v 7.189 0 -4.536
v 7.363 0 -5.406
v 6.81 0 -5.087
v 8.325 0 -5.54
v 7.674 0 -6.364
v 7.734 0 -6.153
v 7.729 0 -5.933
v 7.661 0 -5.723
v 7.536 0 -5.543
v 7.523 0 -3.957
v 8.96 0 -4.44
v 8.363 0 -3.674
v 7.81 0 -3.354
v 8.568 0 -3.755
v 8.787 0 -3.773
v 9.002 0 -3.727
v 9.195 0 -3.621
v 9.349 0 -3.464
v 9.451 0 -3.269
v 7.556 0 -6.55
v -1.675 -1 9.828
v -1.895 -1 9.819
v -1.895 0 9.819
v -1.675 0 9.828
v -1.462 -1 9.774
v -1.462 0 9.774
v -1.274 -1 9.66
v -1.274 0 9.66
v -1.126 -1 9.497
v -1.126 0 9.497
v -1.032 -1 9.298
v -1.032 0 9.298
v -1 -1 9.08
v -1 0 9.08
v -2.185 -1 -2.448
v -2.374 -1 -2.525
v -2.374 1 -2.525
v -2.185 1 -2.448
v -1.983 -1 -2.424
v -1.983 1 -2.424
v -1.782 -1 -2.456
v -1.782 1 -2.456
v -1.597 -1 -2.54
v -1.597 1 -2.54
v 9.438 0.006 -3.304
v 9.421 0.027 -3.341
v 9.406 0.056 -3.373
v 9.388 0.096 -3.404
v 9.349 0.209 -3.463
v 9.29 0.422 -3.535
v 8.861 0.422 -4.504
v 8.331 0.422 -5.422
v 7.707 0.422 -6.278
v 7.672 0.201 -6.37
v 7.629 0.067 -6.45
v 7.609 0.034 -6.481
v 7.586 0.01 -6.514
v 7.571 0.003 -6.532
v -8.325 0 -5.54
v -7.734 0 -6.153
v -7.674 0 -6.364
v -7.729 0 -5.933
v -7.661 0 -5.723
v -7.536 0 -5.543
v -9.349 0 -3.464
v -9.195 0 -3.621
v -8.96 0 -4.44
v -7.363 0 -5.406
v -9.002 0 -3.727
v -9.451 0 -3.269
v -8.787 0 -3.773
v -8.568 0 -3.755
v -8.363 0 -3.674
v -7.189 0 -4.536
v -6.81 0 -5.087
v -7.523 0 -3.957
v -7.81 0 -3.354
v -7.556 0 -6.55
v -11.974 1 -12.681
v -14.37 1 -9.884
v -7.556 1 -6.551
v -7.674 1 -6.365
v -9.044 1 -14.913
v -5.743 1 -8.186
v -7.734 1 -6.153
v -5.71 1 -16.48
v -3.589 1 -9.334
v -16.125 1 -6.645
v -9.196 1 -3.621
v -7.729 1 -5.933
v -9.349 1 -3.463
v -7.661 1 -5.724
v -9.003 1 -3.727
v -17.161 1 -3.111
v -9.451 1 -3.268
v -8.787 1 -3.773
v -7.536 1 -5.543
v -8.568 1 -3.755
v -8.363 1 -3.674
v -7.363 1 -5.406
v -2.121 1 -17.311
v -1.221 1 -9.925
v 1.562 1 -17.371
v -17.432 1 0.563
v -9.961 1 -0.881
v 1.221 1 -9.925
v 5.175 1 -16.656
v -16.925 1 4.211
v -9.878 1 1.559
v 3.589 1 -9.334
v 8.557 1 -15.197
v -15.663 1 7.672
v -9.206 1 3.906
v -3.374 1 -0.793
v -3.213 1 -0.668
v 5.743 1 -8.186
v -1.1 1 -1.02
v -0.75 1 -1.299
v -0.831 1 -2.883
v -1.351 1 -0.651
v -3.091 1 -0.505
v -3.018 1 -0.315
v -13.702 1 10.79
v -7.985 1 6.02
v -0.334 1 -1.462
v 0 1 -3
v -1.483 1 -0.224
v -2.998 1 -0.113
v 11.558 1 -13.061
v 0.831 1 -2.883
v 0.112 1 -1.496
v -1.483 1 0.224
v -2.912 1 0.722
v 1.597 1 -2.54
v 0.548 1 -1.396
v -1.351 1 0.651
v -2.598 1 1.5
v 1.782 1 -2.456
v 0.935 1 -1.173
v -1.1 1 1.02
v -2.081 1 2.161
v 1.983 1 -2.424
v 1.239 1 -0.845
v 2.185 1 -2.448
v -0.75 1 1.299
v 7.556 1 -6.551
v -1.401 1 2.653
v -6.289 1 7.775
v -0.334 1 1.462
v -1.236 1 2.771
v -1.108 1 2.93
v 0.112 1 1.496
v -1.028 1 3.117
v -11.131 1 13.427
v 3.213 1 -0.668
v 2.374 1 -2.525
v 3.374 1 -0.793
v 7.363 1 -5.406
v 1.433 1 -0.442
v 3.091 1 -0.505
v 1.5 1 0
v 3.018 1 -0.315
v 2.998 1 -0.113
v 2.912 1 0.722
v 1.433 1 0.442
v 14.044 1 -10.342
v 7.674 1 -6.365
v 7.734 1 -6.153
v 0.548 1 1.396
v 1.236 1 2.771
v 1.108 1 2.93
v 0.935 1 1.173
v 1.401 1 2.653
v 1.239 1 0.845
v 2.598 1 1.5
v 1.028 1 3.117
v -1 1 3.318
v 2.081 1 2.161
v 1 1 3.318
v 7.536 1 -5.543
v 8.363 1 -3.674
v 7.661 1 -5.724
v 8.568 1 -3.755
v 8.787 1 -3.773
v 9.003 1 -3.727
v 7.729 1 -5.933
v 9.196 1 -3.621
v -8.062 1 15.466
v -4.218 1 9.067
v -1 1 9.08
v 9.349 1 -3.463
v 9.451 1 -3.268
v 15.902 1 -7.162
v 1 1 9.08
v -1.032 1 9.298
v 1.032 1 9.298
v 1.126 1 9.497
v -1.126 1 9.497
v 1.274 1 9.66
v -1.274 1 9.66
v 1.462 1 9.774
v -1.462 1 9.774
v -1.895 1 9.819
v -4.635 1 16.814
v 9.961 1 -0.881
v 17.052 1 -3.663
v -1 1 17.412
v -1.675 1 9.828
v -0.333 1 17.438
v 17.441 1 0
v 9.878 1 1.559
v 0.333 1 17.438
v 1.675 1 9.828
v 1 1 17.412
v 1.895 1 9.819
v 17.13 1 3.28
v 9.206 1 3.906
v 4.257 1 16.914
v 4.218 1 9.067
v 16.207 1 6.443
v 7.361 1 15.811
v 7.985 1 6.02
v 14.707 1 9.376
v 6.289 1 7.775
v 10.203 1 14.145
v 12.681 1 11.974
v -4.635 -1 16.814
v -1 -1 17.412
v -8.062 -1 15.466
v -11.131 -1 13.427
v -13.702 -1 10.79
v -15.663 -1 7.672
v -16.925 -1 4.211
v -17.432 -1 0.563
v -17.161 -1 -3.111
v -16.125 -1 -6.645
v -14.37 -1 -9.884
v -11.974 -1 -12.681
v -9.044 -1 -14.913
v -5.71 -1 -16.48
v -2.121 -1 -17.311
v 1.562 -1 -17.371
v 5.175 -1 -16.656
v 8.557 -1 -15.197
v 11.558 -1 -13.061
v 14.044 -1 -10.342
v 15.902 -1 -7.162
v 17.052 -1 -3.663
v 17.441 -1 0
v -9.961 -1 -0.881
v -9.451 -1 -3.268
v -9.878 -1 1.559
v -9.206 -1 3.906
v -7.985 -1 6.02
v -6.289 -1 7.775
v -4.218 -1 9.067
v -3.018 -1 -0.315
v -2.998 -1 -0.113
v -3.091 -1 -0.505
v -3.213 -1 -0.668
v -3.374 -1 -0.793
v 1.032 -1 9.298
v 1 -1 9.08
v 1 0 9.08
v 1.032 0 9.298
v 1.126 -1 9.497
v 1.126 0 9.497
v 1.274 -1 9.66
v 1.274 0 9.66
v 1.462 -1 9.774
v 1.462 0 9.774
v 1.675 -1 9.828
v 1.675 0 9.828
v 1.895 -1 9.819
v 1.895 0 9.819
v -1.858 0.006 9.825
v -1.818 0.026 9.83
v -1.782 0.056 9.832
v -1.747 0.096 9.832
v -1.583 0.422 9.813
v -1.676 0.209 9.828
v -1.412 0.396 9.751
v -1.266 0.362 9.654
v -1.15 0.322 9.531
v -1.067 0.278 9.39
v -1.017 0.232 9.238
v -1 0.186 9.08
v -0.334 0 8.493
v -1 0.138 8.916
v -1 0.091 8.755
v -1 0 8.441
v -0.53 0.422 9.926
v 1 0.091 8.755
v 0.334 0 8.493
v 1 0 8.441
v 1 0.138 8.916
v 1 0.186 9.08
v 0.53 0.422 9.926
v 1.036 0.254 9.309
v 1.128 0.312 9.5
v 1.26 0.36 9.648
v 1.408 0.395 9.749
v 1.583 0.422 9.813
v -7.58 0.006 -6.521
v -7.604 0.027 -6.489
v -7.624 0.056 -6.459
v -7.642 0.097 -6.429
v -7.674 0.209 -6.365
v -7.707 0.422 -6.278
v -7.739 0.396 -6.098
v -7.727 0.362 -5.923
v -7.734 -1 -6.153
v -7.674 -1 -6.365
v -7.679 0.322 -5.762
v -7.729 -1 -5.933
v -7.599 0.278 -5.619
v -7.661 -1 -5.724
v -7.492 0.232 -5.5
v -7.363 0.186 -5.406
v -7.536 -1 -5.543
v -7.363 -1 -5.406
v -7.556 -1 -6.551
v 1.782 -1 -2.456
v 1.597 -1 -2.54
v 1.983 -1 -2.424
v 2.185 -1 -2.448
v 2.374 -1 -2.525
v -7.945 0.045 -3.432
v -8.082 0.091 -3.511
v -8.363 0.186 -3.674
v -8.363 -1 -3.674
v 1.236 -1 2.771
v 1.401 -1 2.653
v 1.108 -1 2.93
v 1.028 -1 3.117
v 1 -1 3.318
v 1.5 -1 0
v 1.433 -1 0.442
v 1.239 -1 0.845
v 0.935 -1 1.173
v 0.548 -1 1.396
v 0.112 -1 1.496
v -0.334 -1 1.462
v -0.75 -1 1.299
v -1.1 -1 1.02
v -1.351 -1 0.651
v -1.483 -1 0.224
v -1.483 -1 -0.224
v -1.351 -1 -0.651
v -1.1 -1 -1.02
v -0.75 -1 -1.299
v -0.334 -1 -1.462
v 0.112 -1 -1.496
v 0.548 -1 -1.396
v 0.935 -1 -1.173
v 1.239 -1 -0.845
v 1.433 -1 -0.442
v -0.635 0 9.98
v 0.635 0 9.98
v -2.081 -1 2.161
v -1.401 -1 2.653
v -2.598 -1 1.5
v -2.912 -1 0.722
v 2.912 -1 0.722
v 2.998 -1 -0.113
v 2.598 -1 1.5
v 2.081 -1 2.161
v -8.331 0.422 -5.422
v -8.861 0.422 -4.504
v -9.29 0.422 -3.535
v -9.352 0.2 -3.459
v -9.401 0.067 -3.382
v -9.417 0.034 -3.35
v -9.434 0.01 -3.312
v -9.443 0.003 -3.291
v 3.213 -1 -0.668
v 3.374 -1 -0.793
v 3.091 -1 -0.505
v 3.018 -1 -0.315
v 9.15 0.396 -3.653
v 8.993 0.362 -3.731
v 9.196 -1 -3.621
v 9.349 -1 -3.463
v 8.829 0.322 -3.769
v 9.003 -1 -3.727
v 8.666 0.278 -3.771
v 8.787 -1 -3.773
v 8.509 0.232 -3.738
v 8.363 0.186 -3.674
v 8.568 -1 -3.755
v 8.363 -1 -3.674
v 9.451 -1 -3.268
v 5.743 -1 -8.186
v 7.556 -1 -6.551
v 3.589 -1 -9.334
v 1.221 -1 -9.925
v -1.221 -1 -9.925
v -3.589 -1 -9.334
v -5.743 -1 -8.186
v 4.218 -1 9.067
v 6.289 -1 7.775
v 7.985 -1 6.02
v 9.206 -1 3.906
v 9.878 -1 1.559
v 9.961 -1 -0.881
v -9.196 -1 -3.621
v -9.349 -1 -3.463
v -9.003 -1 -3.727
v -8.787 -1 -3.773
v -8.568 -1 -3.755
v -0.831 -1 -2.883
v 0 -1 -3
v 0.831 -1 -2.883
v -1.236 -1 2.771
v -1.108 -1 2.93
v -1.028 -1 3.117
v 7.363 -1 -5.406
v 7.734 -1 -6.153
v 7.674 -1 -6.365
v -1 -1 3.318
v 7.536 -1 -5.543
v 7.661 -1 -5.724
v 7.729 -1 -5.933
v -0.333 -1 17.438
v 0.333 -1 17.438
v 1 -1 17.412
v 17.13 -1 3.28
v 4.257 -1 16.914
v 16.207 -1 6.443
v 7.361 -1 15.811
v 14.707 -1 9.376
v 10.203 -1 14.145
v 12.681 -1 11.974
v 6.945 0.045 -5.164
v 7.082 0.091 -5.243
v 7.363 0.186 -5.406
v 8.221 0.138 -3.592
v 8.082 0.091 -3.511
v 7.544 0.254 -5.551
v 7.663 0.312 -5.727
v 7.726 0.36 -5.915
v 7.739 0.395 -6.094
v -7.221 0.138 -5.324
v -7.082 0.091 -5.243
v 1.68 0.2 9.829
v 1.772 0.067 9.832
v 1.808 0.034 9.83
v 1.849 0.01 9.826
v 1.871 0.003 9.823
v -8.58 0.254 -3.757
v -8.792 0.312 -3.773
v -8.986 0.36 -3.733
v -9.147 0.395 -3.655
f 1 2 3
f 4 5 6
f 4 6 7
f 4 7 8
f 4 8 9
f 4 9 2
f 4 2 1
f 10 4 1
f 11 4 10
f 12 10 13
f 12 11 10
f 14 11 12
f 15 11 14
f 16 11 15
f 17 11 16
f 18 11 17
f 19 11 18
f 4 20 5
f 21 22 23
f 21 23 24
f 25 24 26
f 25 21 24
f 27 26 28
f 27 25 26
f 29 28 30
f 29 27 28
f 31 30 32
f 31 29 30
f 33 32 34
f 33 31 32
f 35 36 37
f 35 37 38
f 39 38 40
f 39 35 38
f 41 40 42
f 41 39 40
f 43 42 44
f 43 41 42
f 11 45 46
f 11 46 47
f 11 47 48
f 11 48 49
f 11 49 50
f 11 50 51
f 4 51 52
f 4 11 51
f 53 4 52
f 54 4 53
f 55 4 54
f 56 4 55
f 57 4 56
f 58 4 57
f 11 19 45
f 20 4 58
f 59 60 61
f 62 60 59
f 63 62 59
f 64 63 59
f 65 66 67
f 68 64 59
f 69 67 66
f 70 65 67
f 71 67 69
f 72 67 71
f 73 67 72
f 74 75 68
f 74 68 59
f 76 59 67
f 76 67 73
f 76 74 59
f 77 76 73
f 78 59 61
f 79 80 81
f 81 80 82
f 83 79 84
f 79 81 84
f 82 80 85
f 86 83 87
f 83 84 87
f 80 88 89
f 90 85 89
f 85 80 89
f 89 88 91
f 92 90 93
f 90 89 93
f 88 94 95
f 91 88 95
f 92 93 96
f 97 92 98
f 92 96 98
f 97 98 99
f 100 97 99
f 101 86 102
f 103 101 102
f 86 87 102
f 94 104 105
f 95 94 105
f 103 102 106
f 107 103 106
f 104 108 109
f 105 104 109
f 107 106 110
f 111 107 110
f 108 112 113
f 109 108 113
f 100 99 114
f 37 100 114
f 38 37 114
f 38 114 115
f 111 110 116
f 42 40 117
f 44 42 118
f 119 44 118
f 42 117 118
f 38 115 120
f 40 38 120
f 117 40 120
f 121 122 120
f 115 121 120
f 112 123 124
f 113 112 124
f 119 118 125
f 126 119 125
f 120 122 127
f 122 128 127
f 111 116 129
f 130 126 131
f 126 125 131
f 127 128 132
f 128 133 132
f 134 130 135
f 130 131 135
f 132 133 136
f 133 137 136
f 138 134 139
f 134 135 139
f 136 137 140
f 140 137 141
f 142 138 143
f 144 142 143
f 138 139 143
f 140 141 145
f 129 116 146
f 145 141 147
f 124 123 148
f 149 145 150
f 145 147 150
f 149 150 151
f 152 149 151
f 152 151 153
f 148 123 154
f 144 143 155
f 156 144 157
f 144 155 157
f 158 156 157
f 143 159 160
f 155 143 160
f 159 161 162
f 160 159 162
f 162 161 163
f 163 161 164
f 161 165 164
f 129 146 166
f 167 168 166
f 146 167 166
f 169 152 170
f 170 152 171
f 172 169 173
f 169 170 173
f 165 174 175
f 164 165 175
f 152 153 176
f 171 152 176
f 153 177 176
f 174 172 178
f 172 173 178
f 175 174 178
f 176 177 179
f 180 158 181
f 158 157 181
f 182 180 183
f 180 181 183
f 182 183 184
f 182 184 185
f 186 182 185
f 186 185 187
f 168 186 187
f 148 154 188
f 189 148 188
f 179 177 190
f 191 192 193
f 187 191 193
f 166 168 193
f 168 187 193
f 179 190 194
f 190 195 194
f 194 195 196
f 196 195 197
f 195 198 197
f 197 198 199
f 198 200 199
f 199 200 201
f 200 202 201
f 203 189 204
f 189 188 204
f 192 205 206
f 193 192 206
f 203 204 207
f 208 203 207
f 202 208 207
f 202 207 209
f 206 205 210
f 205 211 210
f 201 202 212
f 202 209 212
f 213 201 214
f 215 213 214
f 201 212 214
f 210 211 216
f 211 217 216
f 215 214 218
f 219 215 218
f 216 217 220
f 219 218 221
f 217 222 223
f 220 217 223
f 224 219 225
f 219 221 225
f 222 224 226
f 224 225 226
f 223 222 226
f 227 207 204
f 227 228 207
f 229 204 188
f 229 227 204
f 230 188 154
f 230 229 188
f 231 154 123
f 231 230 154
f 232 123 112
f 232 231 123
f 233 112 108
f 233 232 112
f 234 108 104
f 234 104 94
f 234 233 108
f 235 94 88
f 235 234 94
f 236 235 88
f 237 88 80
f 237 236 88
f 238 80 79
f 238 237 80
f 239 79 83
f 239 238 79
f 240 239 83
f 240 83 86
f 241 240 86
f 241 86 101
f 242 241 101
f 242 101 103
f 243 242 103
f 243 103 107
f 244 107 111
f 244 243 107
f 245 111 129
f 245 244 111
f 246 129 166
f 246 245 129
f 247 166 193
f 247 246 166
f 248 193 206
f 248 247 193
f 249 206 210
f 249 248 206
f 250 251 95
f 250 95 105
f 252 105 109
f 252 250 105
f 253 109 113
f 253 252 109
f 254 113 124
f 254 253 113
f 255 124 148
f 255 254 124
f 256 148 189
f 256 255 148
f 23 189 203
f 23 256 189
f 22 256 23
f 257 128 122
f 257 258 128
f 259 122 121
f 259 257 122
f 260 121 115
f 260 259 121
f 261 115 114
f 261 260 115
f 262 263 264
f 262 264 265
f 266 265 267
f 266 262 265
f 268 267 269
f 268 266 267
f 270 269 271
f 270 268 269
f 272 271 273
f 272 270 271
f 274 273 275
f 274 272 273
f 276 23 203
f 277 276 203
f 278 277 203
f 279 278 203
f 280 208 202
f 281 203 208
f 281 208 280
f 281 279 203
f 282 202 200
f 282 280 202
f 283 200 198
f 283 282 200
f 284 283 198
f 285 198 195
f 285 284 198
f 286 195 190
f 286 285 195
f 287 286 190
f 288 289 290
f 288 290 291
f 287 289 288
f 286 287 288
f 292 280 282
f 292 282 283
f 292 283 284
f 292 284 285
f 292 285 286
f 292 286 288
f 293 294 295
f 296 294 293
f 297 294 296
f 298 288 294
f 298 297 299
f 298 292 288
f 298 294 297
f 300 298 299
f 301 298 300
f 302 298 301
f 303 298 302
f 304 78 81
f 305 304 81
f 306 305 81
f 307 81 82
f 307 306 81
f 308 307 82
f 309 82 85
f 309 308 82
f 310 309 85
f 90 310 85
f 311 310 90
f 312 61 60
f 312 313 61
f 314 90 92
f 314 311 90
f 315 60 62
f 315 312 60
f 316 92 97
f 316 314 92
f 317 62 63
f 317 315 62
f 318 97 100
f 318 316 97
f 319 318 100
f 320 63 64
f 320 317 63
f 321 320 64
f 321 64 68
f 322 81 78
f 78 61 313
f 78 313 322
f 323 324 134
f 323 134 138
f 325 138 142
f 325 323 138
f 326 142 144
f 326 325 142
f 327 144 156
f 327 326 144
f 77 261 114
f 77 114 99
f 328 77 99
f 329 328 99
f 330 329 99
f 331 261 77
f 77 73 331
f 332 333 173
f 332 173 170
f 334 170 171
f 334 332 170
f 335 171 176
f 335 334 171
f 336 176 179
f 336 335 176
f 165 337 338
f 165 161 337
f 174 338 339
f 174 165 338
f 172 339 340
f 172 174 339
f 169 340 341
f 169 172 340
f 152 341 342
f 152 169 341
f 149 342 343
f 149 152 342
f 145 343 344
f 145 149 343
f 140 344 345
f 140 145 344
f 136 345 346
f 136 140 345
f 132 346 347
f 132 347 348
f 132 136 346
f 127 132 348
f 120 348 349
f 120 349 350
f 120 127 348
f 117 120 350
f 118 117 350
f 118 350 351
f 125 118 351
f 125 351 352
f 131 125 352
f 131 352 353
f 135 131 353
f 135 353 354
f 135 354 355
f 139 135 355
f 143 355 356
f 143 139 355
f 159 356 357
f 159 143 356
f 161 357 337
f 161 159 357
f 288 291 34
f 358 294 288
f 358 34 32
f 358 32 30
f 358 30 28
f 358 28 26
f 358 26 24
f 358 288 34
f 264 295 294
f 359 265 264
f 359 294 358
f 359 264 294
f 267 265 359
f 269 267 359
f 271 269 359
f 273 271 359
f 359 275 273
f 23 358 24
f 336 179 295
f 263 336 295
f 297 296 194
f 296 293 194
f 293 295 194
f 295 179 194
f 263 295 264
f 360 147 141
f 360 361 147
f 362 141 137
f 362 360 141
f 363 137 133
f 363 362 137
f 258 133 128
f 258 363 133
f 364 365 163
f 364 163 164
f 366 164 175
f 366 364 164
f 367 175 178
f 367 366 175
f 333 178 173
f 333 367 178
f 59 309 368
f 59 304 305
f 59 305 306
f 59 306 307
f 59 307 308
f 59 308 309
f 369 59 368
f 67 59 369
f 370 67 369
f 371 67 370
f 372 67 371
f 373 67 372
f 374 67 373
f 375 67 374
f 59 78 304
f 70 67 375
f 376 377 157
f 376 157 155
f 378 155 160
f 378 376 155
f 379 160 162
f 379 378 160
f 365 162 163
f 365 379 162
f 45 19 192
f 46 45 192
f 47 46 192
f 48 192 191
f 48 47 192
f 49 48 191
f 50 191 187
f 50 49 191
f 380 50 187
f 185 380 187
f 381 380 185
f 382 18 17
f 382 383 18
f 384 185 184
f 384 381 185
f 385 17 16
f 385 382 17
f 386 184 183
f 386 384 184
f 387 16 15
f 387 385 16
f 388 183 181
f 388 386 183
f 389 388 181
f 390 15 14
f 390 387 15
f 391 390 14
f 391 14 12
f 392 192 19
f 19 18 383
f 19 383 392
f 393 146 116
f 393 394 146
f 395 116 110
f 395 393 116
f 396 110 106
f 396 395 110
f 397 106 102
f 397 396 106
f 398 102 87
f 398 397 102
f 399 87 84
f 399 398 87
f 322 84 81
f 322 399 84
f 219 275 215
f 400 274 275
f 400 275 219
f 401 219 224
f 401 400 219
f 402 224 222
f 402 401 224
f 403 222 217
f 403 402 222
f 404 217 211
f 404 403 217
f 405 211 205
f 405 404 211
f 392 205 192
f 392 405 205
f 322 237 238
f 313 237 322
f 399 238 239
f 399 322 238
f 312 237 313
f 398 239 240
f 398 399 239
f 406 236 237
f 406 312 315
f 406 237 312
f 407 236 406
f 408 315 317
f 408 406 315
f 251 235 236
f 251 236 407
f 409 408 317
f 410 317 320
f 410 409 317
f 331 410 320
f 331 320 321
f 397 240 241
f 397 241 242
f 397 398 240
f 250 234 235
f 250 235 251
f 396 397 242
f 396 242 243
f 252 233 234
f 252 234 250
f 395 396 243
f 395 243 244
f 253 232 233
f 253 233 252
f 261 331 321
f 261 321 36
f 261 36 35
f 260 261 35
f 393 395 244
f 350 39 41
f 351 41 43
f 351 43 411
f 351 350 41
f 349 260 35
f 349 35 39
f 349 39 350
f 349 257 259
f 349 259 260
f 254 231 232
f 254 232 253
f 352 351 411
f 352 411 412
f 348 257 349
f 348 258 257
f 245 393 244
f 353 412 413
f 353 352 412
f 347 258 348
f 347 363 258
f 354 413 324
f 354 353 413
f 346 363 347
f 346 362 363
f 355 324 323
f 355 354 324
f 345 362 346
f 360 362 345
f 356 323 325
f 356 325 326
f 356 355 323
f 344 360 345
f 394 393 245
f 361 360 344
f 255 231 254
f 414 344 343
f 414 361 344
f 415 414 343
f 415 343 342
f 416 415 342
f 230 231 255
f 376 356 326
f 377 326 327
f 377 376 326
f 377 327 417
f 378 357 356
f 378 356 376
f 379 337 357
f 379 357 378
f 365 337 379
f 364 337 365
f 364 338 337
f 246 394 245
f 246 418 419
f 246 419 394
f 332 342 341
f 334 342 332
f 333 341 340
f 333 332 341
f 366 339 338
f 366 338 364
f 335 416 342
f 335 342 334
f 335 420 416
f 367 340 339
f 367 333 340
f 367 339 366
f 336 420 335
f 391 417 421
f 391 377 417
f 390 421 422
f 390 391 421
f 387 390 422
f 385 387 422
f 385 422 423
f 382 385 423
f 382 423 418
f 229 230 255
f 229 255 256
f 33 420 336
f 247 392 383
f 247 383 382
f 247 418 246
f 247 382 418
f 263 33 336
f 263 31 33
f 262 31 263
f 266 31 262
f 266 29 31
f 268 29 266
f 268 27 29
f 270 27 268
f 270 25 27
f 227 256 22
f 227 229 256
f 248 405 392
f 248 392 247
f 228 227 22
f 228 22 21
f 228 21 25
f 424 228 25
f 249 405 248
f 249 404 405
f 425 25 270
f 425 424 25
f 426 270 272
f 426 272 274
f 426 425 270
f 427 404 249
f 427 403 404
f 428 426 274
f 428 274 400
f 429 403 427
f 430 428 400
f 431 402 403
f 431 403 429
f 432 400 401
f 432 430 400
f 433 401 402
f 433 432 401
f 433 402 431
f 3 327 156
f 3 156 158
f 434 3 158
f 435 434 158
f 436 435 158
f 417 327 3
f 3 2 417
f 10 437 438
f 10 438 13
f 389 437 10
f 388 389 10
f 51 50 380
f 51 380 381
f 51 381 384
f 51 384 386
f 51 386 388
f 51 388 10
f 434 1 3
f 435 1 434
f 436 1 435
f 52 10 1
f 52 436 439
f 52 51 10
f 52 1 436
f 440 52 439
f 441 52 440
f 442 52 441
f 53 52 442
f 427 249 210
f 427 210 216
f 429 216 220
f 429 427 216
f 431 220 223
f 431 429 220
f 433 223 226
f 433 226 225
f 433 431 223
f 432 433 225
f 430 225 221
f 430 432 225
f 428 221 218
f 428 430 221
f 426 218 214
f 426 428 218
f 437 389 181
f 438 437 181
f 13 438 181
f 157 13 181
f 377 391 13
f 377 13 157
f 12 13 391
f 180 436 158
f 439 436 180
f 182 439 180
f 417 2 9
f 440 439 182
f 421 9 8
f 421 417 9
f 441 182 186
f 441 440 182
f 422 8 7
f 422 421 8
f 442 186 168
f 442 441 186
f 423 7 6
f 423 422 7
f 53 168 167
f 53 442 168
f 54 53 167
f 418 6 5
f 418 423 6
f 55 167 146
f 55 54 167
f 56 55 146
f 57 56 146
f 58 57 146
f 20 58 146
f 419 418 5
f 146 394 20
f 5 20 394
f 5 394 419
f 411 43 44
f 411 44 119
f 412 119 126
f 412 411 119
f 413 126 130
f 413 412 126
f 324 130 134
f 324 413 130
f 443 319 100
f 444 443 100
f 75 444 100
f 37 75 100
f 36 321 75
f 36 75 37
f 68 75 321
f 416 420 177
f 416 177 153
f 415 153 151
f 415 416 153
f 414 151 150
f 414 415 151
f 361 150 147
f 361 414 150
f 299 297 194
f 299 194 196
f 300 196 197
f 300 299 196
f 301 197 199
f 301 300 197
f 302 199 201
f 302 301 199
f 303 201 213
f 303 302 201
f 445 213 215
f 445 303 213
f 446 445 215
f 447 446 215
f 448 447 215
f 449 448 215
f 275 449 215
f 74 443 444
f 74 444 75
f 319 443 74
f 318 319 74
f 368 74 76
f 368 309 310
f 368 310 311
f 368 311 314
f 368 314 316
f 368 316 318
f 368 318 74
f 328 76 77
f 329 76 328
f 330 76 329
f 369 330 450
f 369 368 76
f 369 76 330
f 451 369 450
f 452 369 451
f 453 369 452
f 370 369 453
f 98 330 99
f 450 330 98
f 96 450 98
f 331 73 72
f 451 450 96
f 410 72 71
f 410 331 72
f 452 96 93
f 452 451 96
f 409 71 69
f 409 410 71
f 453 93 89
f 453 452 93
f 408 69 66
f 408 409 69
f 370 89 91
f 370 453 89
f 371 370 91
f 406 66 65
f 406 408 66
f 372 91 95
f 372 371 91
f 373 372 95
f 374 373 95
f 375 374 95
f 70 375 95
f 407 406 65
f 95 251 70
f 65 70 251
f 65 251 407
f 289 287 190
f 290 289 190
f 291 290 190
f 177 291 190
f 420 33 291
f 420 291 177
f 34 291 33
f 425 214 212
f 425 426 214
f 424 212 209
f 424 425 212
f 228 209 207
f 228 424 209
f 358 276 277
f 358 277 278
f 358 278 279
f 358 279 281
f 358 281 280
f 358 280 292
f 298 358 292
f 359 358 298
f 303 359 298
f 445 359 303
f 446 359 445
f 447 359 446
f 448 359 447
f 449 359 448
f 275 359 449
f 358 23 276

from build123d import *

# Parameters (mm, degrees)
F0_R     = 1.5
F1_DEPTH = 1


with BuildPart() as f1:
    # F0 (on Front) → F1 (new body, symmetric)
    with BuildSketch(Plane.XZ):
        with BuildLine():
            ThreePointArc((-1, 17.412308), (-11.973877, -12.681275), (17.441, 0))
            ThreePointArc((17.441, 0), (12.681275, 11.973877), (1, 17.412308))
            ThreePointArc((1, 17.412308), (0, 17.441), (-1, 17.412308))
        make_face()
        with BuildLine():
            ThreePointArc((-2.373679, -2.525145), (-1.983172, -2.424438), (-1.596733, -2.539773))
            ThreePointArc((-1.596733, -2.539773), (0, -3), (1.596733, -2.539773))
            ThreePointArc((1.596733, -2.539773), (1.983172, -2.424438), (2.373679, -2.525145))
            Line((2.373679, -2.525145), (7.363259, -5.40588))
            ThreePointArc((7.363259, -5.40588), (7.729194, -5.933007), (7.555614, -6.550779))
            ThreePointArc((7.555614, -6.550779), (0, -10), (-7.555614, -6.550779))
            ThreePointArc((-7.555614, -6.550779), (-7.729194, -5.933007), (-7.363259, -5.40588))
            Line((-7.363259, -5.40588), (-2.373679, -2.525145))
        make_face(mode=Mode.SUBTRACT)
        with BuildLine():
            ThreePointArc((-9.450948, -3.267964), (-8.660254, 5), (-1.895334, 9.818743))
            ThreePointArc((-1.895334, 9.818743), (-1.273538, 9.660182), (-1, 9.079709))
            Line((-1, 9.079709), (-1, 3.318238))
            ThreePointArc((-1, 3.318238), (-1.108039, 2.929697), (-1.401141, 2.652697))
            ThreePointArc((-1.401141, 2.652697), (-2.598076, 1.5), (-2.997874, -0.112925))
            ThreePointArc((-2.997874, -0.112925), (-3.091211, -0.505258), (-3.373679, -0.793094))
            Line((-3.373679, -0.793094), (-8.363259, -3.673829))
            ThreePointArc((-8.363259, -3.673829), (-9.002732, -3.727174), (-9.450948, -3.267964))
        make_face(mode=Mode.SUBTRACT)
        Circle(F0_R, mode=Mode.SUBTRACT)
        with BuildLine():
            Line((1, 3.318238), (1, 9.079709))
            ThreePointArc((1, 9.079709), (1.273538, 9.660182), (1.895334, 9.818743))
            ThreePointArc((1.895334, 9.818743), (8.660254, 5), (9.450948, -3.267964))
            ThreePointArc((9.450948, -3.267964), (9.002732, -3.727174), (8.363259, -3.673829))
            Line((8.363259, -3.673829), (3.373679, -0.793094))
            ThreePointArc((3.373679, -0.793094), (3.091211, -0.505258), (2.997874, -0.112925))
            ThreePointArc((2.997874, -0.112925), (2.598076, 1.5), (1.401141, 2.652697))
            ThreePointArc((1.401141, 2.652697), (1.108039, 2.929697), (1, 3.318238))
        make_face(mode=Mode.SUBTRACT)
    extrude(amount=F1_DEPTH, both=True)

    # F2 (on Right) → F3 (revolve, cut)
    with BuildSketch(Plane.YZ):
        Polygon((0.4216, 9.94), (0, 10), (0, 8.5), align=None)
    revolve(axis=Axis((0, -2.204443, 0), (0, 1, 0)), mode=Mode.SUBTRACT)


solid = f1.part
